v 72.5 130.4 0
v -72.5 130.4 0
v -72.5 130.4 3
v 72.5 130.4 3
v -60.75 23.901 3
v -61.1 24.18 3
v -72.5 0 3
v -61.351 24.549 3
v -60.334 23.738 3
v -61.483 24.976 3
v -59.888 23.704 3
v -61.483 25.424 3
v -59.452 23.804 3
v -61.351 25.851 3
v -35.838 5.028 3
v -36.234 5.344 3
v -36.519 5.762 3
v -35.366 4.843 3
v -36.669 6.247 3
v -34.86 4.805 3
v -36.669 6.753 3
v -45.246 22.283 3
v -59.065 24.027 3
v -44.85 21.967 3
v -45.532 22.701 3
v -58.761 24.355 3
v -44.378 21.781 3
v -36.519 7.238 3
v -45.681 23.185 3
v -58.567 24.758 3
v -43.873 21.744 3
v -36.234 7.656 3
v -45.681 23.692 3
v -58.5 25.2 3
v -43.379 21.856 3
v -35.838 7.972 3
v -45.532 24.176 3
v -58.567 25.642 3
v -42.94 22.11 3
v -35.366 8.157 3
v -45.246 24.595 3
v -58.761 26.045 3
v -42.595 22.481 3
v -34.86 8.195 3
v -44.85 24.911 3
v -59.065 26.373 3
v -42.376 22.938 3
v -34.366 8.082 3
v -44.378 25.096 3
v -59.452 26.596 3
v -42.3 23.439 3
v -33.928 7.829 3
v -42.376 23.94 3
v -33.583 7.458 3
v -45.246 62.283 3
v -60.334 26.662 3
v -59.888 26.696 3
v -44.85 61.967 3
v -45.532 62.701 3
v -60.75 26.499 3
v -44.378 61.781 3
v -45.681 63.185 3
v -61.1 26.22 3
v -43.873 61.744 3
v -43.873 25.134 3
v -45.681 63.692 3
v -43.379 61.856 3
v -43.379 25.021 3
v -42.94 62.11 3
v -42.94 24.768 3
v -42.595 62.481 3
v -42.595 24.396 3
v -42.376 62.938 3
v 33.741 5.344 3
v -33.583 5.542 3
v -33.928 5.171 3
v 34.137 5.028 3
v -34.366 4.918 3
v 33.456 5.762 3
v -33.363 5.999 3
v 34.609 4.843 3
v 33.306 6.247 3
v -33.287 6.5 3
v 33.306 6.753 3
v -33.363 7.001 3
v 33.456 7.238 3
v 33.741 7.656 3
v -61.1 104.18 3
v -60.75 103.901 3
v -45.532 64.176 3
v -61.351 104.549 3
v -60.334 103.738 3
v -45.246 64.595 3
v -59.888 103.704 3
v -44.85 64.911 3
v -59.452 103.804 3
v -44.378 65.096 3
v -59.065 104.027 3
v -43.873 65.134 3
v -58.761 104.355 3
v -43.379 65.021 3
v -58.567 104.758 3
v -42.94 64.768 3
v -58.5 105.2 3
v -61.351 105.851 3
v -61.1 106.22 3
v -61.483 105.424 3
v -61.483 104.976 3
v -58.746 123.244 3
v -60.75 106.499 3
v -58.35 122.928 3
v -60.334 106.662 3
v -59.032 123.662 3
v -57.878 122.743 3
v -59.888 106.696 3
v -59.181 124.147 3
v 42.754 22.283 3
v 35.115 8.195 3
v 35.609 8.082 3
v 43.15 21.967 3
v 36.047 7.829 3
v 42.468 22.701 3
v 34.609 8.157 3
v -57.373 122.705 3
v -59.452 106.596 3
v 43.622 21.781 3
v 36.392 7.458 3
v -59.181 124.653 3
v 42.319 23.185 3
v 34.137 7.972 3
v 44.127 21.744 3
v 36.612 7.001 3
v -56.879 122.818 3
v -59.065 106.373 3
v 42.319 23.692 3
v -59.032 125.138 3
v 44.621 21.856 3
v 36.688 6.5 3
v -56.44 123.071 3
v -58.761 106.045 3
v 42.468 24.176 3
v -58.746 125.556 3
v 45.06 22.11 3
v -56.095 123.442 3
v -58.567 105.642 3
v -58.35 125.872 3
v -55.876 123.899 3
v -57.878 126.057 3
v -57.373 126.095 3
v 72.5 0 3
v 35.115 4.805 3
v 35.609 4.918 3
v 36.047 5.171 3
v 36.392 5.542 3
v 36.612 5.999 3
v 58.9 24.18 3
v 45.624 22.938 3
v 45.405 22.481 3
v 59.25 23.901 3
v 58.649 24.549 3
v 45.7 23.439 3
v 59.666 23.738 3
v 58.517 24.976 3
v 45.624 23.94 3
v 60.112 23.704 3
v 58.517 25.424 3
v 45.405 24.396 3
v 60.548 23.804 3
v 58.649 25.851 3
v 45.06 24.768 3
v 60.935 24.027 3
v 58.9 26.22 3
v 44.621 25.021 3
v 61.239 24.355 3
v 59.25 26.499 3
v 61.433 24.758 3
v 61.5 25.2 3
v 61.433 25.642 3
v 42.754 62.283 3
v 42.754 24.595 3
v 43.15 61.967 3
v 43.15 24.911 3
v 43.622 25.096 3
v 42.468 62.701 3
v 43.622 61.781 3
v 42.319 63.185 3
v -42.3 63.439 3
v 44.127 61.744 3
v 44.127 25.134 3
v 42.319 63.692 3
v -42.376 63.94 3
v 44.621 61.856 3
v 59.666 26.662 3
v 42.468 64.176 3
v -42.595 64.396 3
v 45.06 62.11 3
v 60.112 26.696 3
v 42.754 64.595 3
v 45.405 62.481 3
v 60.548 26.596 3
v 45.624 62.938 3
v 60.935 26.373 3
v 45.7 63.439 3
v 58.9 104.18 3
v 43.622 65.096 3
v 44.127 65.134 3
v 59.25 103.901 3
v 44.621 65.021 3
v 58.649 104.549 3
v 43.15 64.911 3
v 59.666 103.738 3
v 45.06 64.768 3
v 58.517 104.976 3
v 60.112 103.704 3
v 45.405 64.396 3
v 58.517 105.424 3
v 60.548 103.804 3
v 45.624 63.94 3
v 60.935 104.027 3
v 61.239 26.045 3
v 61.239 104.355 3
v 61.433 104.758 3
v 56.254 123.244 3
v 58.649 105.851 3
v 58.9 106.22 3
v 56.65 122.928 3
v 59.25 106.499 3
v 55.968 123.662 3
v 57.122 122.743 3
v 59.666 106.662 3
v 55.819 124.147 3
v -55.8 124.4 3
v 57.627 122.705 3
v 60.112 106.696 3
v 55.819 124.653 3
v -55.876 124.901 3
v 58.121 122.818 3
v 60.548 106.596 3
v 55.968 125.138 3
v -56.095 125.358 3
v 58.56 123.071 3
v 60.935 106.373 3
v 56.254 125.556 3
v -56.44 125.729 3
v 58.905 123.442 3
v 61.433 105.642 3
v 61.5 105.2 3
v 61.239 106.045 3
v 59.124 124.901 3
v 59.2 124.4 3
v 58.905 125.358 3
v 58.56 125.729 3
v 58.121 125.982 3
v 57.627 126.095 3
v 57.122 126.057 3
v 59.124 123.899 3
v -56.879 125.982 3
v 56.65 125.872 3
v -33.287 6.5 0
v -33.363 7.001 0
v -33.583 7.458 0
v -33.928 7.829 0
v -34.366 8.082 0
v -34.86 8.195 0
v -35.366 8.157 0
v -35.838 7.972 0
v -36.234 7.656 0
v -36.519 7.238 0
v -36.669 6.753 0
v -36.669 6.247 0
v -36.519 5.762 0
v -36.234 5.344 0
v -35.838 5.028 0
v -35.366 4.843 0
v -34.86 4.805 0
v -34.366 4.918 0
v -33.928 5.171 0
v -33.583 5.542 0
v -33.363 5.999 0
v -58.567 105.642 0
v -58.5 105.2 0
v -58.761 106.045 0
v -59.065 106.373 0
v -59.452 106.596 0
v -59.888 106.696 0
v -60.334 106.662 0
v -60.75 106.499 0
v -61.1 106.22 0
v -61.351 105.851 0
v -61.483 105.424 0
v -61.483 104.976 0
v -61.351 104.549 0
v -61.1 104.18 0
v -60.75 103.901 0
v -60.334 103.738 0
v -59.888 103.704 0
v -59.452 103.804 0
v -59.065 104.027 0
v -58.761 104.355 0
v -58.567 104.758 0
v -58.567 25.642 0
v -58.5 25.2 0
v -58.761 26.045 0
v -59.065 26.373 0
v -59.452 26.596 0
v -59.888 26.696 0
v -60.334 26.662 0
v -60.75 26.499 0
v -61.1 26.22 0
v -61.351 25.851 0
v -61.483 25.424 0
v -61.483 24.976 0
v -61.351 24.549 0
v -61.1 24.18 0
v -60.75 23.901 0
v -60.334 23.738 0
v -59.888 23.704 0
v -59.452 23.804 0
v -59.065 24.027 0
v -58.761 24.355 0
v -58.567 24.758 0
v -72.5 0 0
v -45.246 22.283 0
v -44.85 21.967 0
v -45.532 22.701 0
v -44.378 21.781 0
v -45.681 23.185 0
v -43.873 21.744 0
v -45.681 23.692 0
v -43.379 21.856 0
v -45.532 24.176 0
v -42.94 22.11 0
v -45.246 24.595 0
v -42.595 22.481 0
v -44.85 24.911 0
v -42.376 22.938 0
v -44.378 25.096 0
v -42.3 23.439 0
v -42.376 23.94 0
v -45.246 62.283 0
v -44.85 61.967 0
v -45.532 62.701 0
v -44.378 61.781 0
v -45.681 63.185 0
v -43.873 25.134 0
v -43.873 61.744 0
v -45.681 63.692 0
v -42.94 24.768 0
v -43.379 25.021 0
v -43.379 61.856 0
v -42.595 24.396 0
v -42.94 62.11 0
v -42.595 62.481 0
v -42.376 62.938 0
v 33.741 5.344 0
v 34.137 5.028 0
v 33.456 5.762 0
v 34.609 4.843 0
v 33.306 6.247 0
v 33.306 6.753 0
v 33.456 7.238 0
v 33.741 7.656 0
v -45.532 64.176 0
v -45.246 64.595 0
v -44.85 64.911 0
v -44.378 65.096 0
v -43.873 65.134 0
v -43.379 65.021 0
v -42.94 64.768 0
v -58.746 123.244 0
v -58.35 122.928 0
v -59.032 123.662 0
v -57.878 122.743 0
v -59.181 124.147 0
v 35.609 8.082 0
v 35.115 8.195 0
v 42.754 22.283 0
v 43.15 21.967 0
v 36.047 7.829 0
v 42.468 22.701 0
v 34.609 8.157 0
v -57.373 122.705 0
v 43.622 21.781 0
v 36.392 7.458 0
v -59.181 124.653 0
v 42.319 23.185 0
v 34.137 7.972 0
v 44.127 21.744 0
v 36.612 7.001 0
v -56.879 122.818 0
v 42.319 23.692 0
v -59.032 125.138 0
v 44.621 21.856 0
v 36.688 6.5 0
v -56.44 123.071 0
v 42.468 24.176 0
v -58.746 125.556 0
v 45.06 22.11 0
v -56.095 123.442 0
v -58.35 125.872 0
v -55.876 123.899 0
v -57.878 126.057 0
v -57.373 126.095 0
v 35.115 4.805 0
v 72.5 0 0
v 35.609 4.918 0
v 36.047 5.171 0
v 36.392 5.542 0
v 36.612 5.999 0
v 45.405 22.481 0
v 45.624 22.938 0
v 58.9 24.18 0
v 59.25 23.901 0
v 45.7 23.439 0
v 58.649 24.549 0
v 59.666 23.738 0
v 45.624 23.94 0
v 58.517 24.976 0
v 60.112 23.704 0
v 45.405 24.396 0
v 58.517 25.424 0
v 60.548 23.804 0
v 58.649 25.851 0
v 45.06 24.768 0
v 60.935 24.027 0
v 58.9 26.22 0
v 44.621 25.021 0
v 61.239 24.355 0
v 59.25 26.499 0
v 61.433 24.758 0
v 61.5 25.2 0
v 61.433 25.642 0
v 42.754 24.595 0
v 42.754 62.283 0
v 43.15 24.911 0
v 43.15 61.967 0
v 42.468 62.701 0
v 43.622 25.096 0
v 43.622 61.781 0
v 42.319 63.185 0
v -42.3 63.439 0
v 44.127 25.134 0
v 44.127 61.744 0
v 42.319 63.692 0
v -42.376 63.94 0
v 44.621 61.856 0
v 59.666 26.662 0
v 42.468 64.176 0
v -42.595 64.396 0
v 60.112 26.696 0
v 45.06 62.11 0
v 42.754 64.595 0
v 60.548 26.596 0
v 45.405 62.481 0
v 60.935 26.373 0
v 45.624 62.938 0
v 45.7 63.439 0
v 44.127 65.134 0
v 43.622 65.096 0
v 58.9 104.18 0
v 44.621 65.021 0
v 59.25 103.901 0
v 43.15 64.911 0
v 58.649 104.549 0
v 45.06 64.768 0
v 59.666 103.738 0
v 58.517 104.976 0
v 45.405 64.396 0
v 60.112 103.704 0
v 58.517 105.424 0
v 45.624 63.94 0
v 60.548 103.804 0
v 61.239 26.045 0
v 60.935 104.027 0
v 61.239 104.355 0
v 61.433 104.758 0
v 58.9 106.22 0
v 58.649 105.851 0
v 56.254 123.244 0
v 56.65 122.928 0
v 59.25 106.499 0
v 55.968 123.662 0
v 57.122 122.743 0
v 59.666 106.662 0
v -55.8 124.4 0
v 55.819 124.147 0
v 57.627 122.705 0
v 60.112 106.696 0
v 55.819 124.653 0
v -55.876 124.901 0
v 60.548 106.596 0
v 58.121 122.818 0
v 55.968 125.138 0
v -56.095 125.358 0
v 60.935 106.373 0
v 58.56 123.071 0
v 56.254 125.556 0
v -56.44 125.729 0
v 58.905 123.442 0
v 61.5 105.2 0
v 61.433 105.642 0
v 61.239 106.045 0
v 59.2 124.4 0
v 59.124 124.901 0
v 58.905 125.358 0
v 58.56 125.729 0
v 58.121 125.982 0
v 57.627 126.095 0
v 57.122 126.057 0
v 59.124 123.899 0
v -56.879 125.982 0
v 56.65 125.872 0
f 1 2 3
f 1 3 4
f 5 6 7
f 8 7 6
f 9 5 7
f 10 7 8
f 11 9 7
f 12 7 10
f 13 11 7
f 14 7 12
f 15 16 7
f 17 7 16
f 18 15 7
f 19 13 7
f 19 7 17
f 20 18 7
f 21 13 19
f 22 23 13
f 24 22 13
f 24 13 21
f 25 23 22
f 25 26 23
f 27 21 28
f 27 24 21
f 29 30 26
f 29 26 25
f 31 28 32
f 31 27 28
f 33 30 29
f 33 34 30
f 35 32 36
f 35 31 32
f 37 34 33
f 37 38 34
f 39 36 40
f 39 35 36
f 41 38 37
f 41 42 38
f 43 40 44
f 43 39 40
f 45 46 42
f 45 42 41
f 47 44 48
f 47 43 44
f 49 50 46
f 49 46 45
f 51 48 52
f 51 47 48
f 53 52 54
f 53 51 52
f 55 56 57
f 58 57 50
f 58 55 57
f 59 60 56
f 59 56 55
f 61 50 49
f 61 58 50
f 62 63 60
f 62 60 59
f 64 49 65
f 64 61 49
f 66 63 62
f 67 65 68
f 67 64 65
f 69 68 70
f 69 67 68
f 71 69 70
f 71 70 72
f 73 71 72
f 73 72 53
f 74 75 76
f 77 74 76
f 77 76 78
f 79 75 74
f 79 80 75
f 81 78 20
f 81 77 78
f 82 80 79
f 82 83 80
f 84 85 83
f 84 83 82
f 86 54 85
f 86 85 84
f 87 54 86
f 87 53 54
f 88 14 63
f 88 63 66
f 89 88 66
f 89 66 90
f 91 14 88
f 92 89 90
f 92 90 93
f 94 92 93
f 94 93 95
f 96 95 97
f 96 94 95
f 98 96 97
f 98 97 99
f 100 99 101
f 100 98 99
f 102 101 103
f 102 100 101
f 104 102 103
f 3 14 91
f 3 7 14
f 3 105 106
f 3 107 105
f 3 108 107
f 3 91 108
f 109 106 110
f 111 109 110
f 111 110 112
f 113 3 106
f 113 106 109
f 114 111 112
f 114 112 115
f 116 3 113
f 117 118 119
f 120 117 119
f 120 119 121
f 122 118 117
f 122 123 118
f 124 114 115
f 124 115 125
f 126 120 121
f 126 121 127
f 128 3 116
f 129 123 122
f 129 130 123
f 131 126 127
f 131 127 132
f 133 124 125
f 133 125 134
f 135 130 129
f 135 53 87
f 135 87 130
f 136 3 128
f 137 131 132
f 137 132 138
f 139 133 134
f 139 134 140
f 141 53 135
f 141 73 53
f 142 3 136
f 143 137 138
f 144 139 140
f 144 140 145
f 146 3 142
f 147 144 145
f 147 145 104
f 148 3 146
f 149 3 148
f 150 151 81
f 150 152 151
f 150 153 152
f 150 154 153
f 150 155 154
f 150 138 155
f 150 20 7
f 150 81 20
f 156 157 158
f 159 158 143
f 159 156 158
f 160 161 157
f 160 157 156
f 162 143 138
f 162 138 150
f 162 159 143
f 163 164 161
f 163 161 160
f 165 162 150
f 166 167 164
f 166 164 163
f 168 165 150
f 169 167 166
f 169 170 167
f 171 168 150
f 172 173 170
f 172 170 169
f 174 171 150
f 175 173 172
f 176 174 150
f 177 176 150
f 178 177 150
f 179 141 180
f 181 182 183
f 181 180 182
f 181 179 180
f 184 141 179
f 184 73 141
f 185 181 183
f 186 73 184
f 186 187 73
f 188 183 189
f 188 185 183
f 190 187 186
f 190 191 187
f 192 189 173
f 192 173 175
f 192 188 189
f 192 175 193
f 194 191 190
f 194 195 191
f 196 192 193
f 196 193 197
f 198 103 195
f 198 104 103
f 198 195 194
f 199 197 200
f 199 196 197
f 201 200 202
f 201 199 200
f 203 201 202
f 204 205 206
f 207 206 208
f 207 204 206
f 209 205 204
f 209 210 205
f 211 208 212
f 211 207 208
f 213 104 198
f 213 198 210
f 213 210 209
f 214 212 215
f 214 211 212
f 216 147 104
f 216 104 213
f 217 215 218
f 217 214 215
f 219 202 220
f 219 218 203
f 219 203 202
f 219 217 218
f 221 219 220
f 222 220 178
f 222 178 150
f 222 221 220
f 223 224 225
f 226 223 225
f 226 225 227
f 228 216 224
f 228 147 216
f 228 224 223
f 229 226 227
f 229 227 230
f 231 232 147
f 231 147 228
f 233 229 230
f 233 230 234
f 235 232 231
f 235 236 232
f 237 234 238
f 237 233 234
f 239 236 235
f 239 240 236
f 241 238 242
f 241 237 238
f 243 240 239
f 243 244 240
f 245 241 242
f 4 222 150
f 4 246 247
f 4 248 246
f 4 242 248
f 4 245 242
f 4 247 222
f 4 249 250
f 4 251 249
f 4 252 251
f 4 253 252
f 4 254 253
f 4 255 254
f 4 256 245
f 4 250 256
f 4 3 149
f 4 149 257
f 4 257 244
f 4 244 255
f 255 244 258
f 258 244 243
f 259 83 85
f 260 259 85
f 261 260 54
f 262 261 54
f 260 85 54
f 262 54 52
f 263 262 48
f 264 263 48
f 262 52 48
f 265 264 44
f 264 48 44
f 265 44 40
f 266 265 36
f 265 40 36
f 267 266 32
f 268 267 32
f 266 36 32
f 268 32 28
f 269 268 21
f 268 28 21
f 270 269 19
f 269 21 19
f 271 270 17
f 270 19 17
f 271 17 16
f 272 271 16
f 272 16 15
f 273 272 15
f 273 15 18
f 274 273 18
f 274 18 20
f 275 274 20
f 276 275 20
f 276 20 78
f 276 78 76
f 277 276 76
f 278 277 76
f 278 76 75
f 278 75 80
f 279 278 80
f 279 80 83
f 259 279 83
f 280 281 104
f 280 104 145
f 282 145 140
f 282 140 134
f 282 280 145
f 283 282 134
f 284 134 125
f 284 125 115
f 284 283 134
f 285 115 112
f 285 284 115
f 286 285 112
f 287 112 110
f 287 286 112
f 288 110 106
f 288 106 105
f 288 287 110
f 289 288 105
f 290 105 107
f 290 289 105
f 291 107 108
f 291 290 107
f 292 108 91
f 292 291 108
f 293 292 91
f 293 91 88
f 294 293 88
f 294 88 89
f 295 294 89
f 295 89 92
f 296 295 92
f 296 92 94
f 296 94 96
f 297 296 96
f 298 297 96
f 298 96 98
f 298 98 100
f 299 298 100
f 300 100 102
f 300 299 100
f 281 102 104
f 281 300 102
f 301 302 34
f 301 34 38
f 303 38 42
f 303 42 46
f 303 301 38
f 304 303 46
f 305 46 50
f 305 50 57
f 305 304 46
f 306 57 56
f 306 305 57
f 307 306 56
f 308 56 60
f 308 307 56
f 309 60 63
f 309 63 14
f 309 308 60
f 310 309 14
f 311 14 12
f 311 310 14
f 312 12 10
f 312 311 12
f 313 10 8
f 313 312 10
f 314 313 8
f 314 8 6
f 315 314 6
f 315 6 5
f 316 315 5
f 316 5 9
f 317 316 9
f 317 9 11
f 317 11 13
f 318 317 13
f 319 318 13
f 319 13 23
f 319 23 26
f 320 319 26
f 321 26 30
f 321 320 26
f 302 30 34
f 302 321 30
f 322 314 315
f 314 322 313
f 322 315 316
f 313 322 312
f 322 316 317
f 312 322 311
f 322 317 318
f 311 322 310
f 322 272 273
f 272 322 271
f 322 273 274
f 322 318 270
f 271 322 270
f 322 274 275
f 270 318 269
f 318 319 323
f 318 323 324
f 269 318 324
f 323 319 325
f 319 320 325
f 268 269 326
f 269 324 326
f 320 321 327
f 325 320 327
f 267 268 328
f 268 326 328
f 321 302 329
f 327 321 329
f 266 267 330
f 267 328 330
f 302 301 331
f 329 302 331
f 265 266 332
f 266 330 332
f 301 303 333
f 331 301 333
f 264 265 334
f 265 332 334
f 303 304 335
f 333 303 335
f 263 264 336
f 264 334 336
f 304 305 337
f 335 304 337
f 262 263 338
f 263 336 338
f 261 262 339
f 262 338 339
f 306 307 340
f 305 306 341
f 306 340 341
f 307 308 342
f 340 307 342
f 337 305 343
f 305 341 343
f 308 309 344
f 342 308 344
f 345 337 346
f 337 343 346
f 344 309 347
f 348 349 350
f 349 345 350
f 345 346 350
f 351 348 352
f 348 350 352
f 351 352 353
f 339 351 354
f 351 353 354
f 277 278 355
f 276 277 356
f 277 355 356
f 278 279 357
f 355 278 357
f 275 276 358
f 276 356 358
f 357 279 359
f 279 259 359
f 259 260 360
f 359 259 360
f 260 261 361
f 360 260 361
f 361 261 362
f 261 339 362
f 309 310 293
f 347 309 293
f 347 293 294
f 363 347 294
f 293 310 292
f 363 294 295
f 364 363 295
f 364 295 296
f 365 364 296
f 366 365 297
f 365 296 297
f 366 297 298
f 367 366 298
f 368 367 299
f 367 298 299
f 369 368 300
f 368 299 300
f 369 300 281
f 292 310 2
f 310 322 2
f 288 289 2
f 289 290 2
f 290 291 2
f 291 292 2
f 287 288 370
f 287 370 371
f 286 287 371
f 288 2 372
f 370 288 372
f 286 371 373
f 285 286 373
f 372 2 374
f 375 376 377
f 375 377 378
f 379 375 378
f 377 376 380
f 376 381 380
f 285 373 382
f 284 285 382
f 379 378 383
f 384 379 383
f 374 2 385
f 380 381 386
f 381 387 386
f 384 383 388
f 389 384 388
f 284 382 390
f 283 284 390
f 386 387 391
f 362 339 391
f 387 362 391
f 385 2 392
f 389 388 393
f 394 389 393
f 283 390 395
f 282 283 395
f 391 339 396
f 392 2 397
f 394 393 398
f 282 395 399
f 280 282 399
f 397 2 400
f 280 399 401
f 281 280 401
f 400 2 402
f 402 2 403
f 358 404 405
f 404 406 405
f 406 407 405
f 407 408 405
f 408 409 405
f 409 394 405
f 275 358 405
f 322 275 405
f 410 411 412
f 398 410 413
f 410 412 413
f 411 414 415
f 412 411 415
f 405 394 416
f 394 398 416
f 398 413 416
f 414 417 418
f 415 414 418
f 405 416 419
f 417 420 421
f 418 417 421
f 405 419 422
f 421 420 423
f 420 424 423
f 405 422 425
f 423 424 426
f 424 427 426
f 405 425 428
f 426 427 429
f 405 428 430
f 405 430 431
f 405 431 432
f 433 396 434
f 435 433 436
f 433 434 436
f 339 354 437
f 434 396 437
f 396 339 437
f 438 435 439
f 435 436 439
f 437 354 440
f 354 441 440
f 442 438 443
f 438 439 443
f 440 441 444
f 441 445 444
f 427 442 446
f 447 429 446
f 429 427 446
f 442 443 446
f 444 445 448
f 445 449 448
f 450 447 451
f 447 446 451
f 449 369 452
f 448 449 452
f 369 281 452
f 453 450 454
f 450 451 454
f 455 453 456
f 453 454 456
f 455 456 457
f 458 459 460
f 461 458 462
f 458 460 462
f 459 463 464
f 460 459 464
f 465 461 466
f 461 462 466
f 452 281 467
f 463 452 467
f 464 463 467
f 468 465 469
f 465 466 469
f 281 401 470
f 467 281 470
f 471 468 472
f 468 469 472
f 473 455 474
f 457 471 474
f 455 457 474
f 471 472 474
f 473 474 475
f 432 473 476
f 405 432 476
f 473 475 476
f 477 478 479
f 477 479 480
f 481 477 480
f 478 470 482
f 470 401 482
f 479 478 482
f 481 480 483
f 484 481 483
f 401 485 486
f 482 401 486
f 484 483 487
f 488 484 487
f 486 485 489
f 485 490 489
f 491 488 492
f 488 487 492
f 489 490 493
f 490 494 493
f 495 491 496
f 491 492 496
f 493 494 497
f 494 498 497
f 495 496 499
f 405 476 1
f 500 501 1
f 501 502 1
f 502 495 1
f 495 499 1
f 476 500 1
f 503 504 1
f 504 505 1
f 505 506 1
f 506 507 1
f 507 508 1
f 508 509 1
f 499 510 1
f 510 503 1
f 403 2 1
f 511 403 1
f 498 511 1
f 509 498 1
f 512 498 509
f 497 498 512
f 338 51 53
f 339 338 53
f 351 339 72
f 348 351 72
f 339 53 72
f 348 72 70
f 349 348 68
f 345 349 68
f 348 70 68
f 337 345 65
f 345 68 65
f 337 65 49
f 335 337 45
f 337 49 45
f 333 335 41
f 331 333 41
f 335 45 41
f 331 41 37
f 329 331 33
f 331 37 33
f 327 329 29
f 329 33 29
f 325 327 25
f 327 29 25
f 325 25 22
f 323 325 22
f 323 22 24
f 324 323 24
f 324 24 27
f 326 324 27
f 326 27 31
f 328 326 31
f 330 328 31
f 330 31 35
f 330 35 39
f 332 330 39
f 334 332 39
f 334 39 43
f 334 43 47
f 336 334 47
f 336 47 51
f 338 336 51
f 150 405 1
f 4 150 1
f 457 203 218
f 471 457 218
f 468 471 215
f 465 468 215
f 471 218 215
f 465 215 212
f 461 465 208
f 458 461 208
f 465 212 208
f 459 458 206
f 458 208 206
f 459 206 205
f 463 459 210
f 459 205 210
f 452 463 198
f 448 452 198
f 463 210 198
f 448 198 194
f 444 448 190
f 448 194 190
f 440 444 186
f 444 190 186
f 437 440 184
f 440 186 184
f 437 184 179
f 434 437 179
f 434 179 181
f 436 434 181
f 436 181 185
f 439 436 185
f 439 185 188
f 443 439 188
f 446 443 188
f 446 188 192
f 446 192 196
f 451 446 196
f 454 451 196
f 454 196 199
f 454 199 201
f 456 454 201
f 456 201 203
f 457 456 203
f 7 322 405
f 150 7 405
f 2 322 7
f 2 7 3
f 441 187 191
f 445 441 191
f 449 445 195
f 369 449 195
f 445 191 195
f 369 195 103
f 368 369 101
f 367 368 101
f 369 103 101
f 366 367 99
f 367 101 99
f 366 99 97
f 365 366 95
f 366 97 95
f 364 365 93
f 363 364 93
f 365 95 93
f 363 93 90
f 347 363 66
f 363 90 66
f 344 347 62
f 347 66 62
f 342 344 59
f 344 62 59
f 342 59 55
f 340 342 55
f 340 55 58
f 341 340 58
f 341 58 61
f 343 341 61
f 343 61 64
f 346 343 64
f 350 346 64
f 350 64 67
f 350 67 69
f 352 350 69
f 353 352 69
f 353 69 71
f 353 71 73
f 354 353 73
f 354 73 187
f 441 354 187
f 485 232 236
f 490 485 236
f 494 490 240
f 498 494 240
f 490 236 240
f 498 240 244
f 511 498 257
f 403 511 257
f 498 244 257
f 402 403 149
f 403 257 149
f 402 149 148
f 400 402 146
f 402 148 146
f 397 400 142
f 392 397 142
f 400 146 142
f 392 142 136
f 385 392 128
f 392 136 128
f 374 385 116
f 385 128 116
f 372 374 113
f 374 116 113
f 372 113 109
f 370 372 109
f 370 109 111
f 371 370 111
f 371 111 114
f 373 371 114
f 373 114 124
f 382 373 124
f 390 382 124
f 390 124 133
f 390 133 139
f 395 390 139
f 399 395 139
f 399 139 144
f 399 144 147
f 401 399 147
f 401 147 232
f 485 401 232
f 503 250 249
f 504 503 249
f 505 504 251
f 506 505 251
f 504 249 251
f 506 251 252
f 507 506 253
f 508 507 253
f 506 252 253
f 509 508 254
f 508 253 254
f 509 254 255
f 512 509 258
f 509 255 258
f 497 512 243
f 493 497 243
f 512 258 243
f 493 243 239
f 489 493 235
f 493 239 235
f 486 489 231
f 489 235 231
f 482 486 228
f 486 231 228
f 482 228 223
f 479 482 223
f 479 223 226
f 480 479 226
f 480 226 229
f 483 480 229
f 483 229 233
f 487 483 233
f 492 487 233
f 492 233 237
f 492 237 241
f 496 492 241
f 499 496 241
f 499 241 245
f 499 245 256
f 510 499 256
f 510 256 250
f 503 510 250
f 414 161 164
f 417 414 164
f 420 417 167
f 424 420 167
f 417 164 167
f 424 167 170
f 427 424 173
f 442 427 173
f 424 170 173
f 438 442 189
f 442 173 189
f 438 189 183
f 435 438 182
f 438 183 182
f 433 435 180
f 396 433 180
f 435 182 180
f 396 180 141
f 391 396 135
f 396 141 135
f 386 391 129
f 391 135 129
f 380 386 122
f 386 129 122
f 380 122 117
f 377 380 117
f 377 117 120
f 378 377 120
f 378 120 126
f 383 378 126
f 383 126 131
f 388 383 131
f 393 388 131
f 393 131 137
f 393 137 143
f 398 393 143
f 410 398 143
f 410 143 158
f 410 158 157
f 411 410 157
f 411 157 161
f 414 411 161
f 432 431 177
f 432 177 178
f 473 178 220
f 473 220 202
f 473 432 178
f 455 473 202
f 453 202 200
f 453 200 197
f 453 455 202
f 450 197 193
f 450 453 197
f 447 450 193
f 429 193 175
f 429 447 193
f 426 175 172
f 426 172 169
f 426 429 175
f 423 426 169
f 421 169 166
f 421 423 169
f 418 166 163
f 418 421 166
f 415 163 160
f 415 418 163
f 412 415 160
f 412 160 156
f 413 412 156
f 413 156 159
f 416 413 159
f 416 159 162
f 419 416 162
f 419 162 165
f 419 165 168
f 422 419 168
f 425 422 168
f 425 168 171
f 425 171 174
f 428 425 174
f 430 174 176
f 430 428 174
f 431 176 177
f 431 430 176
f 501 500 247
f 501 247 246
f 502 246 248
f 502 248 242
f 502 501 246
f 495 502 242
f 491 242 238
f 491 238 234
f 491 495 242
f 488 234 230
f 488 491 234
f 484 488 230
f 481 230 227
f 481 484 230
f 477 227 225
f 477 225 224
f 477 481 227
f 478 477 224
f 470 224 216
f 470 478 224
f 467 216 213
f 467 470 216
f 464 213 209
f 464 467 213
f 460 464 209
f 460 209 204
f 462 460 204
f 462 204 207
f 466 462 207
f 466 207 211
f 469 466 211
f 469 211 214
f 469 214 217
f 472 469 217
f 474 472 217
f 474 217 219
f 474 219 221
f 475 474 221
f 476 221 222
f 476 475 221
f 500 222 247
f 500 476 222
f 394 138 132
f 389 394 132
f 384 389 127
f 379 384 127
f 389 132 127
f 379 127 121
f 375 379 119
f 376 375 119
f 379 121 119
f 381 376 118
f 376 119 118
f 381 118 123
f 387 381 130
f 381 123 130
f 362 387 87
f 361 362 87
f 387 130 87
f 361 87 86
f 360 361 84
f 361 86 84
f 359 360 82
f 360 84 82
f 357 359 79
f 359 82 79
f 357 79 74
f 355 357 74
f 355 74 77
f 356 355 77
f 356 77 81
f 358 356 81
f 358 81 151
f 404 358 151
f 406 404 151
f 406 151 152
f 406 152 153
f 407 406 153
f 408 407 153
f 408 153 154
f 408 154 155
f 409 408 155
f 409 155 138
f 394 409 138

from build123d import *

# Parameters (mm, degrees)
SKETCH1_W             = 145
SKETCH1_H             = 130.4
SKETCH1_R             = 1.5
BOSS_EXTRUDE1_DEPTH   = 3
SKETCH3_R             = 1.7
DEPENDENT_HOLES_DEPTH = 10


with BuildPart() as part:
    # Sketch1 → Boss-Extrude1 (new body)
    with BuildSketch(Plane.XY):
        with Locations((0, 65.2)):
            Rectangle(SKETCH1_W, SKETCH1_H)
        with Locations((-60, 105.2)):
            Circle(SKETCH1_R, mode=Mode.SUBTRACT)
        with Locations((60, 105.2)):
            Circle(SKETCH1_R, mode=Mode.SUBTRACT)
        with Locations((60, 25.2)):
            Circle(SKETCH1_R, mode=Mode.SUBTRACT)
        with Locations((-60, 25.2)):
            Circle(SKETCH1_R, mode=Mode.SUBTRACT)
    extrude(amount=BOSS_EXTRUDE1_DEPTH)

    # Sketch3 → dependent_holes (cut)
    with BuildSketch(Plane.XY.offset(3)):
        with Locations((-57.5, 124.4)):
            Circle(SKETCH3_R)
        with Locations((57.5, 124.4)):
            Circle(SKETCH3_R)
        with Locations((-44, 63.438804225)):
            Circle(SKETCH3_R)
        with Locations((-44, 23.438804225)):
            Circle(SKETCH3_R)
        with Locations((44, 23.438804225)):
            Circle(SKETCH3_R)
        with Locations((44, 63.438804225)):
            Circle(SKETCH3_R)
        with Locations((-34.9875, 6.5)):
            Circle(SKETCH3_R)
        with Locations((34.9875, 6.5)):
            Circle(SKETCH3_R)
    extrude(amount=-DEPENDENT_HOLES_DEPTH, mode=Mode.SUBTRACT)


solid = part.part
